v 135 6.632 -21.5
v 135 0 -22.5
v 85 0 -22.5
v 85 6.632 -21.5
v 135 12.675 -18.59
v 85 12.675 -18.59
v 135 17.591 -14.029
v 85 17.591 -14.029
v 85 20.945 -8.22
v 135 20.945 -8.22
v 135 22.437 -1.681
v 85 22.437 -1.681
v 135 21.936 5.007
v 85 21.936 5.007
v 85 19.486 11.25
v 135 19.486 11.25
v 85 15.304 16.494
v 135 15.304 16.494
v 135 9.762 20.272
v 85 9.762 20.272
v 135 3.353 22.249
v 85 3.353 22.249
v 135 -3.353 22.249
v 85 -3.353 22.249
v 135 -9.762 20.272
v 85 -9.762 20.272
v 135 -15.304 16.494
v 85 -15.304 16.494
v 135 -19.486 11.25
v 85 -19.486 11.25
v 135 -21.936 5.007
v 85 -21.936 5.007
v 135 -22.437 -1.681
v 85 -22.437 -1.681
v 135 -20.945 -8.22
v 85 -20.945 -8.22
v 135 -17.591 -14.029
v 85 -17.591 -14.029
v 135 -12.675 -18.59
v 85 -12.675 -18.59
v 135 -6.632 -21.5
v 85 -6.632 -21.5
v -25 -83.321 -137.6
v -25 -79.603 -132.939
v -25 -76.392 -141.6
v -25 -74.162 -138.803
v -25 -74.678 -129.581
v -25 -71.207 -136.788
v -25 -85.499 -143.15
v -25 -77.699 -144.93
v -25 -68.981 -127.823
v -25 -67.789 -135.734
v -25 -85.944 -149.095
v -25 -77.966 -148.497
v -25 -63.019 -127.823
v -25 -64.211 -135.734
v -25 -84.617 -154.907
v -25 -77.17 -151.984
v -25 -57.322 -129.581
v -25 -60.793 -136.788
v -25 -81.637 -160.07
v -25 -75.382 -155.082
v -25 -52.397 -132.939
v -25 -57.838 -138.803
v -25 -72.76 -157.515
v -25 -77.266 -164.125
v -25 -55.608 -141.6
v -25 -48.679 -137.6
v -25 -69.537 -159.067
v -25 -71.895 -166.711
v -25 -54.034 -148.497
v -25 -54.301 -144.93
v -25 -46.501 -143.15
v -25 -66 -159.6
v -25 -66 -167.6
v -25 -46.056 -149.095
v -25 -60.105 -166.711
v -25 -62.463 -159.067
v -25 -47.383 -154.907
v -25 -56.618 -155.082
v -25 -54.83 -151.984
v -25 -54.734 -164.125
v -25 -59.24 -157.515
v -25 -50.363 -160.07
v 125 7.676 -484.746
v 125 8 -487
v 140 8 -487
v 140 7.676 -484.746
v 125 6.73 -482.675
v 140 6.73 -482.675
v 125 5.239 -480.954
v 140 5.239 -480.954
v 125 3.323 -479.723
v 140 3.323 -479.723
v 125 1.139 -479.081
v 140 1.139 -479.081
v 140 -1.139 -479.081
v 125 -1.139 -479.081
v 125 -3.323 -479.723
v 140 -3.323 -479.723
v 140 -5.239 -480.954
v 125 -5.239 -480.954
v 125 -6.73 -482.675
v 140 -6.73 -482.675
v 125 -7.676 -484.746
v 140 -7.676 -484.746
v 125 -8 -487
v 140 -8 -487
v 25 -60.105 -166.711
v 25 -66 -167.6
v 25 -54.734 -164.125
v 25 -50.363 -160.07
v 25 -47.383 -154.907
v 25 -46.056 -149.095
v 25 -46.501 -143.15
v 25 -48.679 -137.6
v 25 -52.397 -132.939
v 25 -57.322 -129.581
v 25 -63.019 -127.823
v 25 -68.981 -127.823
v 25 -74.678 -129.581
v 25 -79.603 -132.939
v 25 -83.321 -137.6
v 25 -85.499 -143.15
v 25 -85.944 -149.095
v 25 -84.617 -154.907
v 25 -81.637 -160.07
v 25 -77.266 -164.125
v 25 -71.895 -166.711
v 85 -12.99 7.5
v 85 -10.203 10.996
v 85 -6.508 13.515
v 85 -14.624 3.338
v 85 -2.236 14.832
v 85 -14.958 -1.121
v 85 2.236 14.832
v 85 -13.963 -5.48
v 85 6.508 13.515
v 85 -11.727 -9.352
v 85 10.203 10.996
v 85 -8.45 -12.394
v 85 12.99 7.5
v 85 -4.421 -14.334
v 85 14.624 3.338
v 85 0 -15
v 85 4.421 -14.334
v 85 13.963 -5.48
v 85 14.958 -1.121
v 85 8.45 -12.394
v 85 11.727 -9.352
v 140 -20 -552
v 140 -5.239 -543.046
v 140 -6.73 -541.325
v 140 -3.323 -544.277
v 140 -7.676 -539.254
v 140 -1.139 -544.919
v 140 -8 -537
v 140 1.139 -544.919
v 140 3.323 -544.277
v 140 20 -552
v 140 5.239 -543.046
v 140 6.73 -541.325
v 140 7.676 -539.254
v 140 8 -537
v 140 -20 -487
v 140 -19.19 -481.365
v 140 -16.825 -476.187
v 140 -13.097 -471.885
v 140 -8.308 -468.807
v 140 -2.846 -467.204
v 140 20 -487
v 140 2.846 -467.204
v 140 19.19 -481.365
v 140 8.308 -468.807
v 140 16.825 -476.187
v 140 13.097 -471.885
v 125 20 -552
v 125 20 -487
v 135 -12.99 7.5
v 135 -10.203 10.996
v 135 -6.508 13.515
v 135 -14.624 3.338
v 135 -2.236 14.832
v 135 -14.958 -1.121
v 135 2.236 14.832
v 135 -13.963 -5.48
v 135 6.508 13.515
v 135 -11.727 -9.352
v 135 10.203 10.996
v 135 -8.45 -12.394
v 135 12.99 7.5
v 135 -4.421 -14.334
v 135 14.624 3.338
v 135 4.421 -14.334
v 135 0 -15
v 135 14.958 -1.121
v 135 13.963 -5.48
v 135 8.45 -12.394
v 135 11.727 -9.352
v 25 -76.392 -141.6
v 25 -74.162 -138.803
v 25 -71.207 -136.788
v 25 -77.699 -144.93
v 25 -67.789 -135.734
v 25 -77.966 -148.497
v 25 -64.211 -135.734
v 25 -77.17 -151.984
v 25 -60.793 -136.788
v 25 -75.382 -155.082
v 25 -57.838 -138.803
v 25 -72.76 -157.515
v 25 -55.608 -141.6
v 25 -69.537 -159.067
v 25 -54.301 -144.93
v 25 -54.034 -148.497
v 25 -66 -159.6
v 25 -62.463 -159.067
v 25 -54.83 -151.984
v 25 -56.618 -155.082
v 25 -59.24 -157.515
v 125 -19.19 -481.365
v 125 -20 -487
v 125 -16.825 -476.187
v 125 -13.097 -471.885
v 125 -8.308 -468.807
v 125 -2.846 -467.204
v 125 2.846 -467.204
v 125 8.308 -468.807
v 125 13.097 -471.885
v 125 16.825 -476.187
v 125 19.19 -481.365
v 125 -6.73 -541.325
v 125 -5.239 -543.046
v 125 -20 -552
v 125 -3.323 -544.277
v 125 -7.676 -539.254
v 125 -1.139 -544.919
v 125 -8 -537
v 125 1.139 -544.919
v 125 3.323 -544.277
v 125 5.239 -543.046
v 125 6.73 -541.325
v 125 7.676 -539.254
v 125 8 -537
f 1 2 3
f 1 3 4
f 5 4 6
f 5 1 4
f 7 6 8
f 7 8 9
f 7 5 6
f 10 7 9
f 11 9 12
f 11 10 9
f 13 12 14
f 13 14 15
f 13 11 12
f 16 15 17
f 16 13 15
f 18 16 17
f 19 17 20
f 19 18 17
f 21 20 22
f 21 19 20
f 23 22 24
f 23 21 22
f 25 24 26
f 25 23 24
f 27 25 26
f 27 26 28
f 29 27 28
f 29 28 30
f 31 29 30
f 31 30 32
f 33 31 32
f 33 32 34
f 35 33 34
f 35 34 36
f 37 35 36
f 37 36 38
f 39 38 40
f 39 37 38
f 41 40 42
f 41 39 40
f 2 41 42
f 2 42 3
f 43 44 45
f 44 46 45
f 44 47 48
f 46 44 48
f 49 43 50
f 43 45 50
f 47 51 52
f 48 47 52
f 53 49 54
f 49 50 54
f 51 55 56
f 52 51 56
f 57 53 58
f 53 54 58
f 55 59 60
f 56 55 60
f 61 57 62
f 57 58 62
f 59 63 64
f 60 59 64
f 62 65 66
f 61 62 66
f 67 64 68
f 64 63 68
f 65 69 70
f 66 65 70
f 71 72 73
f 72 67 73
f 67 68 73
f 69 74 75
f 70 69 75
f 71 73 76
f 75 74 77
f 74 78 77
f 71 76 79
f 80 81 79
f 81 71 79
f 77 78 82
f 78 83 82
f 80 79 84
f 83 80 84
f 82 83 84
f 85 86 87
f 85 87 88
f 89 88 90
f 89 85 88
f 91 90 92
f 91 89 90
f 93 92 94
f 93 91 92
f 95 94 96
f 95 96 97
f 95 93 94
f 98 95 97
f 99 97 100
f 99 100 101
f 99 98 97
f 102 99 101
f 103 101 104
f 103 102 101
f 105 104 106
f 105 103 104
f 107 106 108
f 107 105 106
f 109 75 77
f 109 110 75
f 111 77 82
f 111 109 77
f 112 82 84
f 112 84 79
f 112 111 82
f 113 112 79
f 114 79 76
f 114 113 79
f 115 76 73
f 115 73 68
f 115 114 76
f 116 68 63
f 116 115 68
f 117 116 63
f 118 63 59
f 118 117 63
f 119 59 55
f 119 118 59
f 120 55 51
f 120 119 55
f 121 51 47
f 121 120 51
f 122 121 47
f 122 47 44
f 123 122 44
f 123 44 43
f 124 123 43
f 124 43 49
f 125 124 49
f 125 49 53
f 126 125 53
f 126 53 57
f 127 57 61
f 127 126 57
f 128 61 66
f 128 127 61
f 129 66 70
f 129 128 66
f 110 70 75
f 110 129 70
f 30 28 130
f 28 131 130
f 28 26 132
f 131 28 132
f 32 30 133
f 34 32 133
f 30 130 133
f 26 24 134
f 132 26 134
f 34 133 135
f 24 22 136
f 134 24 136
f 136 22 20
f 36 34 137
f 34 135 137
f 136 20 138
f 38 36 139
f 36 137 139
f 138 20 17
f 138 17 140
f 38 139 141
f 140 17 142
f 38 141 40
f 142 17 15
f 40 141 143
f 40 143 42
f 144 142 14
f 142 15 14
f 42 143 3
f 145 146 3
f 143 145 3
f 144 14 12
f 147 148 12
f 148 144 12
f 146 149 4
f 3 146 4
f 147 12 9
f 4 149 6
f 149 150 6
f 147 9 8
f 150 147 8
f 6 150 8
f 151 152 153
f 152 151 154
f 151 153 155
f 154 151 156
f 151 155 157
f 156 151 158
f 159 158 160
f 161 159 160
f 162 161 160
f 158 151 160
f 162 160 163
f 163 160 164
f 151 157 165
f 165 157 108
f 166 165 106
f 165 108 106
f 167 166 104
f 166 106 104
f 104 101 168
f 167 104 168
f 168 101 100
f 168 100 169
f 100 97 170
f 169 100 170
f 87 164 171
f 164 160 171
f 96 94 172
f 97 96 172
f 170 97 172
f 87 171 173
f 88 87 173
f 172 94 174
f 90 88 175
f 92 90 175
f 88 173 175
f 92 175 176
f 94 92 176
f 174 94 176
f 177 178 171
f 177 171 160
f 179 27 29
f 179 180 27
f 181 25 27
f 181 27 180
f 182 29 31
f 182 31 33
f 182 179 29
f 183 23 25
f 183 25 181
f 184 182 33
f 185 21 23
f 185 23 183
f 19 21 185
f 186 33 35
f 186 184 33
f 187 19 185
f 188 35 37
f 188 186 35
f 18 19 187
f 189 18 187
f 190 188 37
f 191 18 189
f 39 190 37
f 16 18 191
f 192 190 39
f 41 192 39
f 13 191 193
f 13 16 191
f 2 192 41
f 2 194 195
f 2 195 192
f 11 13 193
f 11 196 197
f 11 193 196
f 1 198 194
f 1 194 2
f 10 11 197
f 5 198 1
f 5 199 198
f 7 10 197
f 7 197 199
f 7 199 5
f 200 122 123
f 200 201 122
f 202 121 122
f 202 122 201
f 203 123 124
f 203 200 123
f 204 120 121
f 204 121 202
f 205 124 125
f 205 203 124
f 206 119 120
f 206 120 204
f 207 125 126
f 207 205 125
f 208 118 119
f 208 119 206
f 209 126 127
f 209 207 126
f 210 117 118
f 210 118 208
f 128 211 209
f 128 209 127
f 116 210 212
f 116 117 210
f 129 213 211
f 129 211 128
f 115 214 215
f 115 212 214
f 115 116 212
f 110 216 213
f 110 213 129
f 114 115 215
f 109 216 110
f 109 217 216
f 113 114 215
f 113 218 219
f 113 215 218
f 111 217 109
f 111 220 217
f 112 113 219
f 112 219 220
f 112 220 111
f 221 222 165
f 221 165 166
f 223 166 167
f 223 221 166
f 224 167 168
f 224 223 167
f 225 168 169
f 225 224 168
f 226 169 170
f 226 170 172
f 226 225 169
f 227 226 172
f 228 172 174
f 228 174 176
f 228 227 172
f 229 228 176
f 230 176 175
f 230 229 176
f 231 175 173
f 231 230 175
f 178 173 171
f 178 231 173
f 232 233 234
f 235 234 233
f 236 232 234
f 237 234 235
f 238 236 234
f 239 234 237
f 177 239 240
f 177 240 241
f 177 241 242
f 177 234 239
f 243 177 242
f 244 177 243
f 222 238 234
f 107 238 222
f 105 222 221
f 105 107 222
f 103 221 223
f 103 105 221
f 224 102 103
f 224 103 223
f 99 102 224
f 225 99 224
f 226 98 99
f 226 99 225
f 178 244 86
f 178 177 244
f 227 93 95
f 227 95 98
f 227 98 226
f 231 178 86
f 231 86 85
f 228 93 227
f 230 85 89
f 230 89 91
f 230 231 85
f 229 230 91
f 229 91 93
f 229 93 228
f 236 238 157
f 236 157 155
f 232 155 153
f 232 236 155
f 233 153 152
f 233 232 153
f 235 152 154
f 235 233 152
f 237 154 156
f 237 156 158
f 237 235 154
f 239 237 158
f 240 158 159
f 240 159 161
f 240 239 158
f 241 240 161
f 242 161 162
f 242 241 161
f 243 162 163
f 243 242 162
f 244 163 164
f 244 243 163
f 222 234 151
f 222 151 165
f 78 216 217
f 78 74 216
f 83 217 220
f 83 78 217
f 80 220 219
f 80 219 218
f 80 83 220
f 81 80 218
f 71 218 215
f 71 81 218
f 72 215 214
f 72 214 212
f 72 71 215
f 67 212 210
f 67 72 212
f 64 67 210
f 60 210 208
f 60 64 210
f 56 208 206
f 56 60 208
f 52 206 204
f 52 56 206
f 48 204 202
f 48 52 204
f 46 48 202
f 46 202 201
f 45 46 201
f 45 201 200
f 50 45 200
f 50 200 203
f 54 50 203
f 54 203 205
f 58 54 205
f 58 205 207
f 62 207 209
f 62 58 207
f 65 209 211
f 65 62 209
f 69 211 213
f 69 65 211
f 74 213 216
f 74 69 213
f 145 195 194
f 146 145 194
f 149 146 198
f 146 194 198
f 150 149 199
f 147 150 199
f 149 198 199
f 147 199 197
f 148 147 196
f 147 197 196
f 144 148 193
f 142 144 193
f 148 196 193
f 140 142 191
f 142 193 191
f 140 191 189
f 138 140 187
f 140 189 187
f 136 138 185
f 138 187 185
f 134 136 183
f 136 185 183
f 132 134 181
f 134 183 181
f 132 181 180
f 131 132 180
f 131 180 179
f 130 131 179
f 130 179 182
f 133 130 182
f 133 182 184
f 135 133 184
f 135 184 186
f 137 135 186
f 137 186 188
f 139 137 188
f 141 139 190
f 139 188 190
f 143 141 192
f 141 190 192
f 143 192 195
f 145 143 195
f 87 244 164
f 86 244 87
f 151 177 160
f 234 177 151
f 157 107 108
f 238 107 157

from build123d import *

# Parameters (mm, degrees)
SZKIC_INSERT_RAMA_R      = 22.5
SZKIC_INSERT_RAMA_R_2    = 15
RAMA_DEPTH               = 50
SZKIC_INSERT_LINKAGE_R   = 20
SZKIC_INSERT_LINKAGE_R_2 = 12
LINKAGE_DEPTH            = 25
TYLNE_KO_O_DEPTH         = 15


with BuildPart() as part:
    # Szkic - insert - rama → Rama (new body)
    with BuildSketch(Plane(origin=(135, 0, 0), x_dir=(0, 0, -1), z_dir=(1, 0, 0))):
        Circle(SZKIC_INSERT_RAMA_R)
        Circle(SZKIC_INSERT_RAMA_R_2, mode=Mode.SUBTRACT)
    extrude(amount=-RAMA_DEPTH)


with BuildPart() as body_2:
    # Szkic - insert - linkage → Linkage (new, symmetric)
    with BuildSketch(Plane(origin=(0, 0, 0), x_dir=(0, 0, -1), z_dir=(1, 0, 0))):
        with Locations((147.6, -66)):
            Circle(SZKIC_INSERT_LINKAGE_R)
        with Locations((147.6, -66)):
            Circle(SZKIC_INSERT_LINKAGE_R_2, mode=Mode.SUBTRACT)
    extrude(amount=LINKAGE_DEPTH, both=True)


with BuildPart() as body_3:
    # Szkic - insert - tylne koło → Tylne koło (new body)
    with BuildSketch(Plane(origin=(125, 0, 0), x_dir=(0, 0, -1), z_dir=(1, 0, 0))):
        with BuildLine():
            Line((487, 20), (552, 20))
            Line((552, 20), (552, -20))
            Line((552, -20), (487, -20))
            ThreePointArc((487, -20), (467, 0), (487, 20))
        make_face()
        with BuildLine():
            Line((537, 8), (487, 8))
            ThreePointArc((487, 8), (479, 0), (487, -8))
            Line((487, -8), (537, -8))
            ThreePointArc((537, -8), (545, 0), (537, 8))
        make_face(mode=Mode.SUBTRACT)
    extrude(amount=TYLNE_KO_O_DEPTH)


solid = Compound([part.part, body_2.part, body_3.part])
